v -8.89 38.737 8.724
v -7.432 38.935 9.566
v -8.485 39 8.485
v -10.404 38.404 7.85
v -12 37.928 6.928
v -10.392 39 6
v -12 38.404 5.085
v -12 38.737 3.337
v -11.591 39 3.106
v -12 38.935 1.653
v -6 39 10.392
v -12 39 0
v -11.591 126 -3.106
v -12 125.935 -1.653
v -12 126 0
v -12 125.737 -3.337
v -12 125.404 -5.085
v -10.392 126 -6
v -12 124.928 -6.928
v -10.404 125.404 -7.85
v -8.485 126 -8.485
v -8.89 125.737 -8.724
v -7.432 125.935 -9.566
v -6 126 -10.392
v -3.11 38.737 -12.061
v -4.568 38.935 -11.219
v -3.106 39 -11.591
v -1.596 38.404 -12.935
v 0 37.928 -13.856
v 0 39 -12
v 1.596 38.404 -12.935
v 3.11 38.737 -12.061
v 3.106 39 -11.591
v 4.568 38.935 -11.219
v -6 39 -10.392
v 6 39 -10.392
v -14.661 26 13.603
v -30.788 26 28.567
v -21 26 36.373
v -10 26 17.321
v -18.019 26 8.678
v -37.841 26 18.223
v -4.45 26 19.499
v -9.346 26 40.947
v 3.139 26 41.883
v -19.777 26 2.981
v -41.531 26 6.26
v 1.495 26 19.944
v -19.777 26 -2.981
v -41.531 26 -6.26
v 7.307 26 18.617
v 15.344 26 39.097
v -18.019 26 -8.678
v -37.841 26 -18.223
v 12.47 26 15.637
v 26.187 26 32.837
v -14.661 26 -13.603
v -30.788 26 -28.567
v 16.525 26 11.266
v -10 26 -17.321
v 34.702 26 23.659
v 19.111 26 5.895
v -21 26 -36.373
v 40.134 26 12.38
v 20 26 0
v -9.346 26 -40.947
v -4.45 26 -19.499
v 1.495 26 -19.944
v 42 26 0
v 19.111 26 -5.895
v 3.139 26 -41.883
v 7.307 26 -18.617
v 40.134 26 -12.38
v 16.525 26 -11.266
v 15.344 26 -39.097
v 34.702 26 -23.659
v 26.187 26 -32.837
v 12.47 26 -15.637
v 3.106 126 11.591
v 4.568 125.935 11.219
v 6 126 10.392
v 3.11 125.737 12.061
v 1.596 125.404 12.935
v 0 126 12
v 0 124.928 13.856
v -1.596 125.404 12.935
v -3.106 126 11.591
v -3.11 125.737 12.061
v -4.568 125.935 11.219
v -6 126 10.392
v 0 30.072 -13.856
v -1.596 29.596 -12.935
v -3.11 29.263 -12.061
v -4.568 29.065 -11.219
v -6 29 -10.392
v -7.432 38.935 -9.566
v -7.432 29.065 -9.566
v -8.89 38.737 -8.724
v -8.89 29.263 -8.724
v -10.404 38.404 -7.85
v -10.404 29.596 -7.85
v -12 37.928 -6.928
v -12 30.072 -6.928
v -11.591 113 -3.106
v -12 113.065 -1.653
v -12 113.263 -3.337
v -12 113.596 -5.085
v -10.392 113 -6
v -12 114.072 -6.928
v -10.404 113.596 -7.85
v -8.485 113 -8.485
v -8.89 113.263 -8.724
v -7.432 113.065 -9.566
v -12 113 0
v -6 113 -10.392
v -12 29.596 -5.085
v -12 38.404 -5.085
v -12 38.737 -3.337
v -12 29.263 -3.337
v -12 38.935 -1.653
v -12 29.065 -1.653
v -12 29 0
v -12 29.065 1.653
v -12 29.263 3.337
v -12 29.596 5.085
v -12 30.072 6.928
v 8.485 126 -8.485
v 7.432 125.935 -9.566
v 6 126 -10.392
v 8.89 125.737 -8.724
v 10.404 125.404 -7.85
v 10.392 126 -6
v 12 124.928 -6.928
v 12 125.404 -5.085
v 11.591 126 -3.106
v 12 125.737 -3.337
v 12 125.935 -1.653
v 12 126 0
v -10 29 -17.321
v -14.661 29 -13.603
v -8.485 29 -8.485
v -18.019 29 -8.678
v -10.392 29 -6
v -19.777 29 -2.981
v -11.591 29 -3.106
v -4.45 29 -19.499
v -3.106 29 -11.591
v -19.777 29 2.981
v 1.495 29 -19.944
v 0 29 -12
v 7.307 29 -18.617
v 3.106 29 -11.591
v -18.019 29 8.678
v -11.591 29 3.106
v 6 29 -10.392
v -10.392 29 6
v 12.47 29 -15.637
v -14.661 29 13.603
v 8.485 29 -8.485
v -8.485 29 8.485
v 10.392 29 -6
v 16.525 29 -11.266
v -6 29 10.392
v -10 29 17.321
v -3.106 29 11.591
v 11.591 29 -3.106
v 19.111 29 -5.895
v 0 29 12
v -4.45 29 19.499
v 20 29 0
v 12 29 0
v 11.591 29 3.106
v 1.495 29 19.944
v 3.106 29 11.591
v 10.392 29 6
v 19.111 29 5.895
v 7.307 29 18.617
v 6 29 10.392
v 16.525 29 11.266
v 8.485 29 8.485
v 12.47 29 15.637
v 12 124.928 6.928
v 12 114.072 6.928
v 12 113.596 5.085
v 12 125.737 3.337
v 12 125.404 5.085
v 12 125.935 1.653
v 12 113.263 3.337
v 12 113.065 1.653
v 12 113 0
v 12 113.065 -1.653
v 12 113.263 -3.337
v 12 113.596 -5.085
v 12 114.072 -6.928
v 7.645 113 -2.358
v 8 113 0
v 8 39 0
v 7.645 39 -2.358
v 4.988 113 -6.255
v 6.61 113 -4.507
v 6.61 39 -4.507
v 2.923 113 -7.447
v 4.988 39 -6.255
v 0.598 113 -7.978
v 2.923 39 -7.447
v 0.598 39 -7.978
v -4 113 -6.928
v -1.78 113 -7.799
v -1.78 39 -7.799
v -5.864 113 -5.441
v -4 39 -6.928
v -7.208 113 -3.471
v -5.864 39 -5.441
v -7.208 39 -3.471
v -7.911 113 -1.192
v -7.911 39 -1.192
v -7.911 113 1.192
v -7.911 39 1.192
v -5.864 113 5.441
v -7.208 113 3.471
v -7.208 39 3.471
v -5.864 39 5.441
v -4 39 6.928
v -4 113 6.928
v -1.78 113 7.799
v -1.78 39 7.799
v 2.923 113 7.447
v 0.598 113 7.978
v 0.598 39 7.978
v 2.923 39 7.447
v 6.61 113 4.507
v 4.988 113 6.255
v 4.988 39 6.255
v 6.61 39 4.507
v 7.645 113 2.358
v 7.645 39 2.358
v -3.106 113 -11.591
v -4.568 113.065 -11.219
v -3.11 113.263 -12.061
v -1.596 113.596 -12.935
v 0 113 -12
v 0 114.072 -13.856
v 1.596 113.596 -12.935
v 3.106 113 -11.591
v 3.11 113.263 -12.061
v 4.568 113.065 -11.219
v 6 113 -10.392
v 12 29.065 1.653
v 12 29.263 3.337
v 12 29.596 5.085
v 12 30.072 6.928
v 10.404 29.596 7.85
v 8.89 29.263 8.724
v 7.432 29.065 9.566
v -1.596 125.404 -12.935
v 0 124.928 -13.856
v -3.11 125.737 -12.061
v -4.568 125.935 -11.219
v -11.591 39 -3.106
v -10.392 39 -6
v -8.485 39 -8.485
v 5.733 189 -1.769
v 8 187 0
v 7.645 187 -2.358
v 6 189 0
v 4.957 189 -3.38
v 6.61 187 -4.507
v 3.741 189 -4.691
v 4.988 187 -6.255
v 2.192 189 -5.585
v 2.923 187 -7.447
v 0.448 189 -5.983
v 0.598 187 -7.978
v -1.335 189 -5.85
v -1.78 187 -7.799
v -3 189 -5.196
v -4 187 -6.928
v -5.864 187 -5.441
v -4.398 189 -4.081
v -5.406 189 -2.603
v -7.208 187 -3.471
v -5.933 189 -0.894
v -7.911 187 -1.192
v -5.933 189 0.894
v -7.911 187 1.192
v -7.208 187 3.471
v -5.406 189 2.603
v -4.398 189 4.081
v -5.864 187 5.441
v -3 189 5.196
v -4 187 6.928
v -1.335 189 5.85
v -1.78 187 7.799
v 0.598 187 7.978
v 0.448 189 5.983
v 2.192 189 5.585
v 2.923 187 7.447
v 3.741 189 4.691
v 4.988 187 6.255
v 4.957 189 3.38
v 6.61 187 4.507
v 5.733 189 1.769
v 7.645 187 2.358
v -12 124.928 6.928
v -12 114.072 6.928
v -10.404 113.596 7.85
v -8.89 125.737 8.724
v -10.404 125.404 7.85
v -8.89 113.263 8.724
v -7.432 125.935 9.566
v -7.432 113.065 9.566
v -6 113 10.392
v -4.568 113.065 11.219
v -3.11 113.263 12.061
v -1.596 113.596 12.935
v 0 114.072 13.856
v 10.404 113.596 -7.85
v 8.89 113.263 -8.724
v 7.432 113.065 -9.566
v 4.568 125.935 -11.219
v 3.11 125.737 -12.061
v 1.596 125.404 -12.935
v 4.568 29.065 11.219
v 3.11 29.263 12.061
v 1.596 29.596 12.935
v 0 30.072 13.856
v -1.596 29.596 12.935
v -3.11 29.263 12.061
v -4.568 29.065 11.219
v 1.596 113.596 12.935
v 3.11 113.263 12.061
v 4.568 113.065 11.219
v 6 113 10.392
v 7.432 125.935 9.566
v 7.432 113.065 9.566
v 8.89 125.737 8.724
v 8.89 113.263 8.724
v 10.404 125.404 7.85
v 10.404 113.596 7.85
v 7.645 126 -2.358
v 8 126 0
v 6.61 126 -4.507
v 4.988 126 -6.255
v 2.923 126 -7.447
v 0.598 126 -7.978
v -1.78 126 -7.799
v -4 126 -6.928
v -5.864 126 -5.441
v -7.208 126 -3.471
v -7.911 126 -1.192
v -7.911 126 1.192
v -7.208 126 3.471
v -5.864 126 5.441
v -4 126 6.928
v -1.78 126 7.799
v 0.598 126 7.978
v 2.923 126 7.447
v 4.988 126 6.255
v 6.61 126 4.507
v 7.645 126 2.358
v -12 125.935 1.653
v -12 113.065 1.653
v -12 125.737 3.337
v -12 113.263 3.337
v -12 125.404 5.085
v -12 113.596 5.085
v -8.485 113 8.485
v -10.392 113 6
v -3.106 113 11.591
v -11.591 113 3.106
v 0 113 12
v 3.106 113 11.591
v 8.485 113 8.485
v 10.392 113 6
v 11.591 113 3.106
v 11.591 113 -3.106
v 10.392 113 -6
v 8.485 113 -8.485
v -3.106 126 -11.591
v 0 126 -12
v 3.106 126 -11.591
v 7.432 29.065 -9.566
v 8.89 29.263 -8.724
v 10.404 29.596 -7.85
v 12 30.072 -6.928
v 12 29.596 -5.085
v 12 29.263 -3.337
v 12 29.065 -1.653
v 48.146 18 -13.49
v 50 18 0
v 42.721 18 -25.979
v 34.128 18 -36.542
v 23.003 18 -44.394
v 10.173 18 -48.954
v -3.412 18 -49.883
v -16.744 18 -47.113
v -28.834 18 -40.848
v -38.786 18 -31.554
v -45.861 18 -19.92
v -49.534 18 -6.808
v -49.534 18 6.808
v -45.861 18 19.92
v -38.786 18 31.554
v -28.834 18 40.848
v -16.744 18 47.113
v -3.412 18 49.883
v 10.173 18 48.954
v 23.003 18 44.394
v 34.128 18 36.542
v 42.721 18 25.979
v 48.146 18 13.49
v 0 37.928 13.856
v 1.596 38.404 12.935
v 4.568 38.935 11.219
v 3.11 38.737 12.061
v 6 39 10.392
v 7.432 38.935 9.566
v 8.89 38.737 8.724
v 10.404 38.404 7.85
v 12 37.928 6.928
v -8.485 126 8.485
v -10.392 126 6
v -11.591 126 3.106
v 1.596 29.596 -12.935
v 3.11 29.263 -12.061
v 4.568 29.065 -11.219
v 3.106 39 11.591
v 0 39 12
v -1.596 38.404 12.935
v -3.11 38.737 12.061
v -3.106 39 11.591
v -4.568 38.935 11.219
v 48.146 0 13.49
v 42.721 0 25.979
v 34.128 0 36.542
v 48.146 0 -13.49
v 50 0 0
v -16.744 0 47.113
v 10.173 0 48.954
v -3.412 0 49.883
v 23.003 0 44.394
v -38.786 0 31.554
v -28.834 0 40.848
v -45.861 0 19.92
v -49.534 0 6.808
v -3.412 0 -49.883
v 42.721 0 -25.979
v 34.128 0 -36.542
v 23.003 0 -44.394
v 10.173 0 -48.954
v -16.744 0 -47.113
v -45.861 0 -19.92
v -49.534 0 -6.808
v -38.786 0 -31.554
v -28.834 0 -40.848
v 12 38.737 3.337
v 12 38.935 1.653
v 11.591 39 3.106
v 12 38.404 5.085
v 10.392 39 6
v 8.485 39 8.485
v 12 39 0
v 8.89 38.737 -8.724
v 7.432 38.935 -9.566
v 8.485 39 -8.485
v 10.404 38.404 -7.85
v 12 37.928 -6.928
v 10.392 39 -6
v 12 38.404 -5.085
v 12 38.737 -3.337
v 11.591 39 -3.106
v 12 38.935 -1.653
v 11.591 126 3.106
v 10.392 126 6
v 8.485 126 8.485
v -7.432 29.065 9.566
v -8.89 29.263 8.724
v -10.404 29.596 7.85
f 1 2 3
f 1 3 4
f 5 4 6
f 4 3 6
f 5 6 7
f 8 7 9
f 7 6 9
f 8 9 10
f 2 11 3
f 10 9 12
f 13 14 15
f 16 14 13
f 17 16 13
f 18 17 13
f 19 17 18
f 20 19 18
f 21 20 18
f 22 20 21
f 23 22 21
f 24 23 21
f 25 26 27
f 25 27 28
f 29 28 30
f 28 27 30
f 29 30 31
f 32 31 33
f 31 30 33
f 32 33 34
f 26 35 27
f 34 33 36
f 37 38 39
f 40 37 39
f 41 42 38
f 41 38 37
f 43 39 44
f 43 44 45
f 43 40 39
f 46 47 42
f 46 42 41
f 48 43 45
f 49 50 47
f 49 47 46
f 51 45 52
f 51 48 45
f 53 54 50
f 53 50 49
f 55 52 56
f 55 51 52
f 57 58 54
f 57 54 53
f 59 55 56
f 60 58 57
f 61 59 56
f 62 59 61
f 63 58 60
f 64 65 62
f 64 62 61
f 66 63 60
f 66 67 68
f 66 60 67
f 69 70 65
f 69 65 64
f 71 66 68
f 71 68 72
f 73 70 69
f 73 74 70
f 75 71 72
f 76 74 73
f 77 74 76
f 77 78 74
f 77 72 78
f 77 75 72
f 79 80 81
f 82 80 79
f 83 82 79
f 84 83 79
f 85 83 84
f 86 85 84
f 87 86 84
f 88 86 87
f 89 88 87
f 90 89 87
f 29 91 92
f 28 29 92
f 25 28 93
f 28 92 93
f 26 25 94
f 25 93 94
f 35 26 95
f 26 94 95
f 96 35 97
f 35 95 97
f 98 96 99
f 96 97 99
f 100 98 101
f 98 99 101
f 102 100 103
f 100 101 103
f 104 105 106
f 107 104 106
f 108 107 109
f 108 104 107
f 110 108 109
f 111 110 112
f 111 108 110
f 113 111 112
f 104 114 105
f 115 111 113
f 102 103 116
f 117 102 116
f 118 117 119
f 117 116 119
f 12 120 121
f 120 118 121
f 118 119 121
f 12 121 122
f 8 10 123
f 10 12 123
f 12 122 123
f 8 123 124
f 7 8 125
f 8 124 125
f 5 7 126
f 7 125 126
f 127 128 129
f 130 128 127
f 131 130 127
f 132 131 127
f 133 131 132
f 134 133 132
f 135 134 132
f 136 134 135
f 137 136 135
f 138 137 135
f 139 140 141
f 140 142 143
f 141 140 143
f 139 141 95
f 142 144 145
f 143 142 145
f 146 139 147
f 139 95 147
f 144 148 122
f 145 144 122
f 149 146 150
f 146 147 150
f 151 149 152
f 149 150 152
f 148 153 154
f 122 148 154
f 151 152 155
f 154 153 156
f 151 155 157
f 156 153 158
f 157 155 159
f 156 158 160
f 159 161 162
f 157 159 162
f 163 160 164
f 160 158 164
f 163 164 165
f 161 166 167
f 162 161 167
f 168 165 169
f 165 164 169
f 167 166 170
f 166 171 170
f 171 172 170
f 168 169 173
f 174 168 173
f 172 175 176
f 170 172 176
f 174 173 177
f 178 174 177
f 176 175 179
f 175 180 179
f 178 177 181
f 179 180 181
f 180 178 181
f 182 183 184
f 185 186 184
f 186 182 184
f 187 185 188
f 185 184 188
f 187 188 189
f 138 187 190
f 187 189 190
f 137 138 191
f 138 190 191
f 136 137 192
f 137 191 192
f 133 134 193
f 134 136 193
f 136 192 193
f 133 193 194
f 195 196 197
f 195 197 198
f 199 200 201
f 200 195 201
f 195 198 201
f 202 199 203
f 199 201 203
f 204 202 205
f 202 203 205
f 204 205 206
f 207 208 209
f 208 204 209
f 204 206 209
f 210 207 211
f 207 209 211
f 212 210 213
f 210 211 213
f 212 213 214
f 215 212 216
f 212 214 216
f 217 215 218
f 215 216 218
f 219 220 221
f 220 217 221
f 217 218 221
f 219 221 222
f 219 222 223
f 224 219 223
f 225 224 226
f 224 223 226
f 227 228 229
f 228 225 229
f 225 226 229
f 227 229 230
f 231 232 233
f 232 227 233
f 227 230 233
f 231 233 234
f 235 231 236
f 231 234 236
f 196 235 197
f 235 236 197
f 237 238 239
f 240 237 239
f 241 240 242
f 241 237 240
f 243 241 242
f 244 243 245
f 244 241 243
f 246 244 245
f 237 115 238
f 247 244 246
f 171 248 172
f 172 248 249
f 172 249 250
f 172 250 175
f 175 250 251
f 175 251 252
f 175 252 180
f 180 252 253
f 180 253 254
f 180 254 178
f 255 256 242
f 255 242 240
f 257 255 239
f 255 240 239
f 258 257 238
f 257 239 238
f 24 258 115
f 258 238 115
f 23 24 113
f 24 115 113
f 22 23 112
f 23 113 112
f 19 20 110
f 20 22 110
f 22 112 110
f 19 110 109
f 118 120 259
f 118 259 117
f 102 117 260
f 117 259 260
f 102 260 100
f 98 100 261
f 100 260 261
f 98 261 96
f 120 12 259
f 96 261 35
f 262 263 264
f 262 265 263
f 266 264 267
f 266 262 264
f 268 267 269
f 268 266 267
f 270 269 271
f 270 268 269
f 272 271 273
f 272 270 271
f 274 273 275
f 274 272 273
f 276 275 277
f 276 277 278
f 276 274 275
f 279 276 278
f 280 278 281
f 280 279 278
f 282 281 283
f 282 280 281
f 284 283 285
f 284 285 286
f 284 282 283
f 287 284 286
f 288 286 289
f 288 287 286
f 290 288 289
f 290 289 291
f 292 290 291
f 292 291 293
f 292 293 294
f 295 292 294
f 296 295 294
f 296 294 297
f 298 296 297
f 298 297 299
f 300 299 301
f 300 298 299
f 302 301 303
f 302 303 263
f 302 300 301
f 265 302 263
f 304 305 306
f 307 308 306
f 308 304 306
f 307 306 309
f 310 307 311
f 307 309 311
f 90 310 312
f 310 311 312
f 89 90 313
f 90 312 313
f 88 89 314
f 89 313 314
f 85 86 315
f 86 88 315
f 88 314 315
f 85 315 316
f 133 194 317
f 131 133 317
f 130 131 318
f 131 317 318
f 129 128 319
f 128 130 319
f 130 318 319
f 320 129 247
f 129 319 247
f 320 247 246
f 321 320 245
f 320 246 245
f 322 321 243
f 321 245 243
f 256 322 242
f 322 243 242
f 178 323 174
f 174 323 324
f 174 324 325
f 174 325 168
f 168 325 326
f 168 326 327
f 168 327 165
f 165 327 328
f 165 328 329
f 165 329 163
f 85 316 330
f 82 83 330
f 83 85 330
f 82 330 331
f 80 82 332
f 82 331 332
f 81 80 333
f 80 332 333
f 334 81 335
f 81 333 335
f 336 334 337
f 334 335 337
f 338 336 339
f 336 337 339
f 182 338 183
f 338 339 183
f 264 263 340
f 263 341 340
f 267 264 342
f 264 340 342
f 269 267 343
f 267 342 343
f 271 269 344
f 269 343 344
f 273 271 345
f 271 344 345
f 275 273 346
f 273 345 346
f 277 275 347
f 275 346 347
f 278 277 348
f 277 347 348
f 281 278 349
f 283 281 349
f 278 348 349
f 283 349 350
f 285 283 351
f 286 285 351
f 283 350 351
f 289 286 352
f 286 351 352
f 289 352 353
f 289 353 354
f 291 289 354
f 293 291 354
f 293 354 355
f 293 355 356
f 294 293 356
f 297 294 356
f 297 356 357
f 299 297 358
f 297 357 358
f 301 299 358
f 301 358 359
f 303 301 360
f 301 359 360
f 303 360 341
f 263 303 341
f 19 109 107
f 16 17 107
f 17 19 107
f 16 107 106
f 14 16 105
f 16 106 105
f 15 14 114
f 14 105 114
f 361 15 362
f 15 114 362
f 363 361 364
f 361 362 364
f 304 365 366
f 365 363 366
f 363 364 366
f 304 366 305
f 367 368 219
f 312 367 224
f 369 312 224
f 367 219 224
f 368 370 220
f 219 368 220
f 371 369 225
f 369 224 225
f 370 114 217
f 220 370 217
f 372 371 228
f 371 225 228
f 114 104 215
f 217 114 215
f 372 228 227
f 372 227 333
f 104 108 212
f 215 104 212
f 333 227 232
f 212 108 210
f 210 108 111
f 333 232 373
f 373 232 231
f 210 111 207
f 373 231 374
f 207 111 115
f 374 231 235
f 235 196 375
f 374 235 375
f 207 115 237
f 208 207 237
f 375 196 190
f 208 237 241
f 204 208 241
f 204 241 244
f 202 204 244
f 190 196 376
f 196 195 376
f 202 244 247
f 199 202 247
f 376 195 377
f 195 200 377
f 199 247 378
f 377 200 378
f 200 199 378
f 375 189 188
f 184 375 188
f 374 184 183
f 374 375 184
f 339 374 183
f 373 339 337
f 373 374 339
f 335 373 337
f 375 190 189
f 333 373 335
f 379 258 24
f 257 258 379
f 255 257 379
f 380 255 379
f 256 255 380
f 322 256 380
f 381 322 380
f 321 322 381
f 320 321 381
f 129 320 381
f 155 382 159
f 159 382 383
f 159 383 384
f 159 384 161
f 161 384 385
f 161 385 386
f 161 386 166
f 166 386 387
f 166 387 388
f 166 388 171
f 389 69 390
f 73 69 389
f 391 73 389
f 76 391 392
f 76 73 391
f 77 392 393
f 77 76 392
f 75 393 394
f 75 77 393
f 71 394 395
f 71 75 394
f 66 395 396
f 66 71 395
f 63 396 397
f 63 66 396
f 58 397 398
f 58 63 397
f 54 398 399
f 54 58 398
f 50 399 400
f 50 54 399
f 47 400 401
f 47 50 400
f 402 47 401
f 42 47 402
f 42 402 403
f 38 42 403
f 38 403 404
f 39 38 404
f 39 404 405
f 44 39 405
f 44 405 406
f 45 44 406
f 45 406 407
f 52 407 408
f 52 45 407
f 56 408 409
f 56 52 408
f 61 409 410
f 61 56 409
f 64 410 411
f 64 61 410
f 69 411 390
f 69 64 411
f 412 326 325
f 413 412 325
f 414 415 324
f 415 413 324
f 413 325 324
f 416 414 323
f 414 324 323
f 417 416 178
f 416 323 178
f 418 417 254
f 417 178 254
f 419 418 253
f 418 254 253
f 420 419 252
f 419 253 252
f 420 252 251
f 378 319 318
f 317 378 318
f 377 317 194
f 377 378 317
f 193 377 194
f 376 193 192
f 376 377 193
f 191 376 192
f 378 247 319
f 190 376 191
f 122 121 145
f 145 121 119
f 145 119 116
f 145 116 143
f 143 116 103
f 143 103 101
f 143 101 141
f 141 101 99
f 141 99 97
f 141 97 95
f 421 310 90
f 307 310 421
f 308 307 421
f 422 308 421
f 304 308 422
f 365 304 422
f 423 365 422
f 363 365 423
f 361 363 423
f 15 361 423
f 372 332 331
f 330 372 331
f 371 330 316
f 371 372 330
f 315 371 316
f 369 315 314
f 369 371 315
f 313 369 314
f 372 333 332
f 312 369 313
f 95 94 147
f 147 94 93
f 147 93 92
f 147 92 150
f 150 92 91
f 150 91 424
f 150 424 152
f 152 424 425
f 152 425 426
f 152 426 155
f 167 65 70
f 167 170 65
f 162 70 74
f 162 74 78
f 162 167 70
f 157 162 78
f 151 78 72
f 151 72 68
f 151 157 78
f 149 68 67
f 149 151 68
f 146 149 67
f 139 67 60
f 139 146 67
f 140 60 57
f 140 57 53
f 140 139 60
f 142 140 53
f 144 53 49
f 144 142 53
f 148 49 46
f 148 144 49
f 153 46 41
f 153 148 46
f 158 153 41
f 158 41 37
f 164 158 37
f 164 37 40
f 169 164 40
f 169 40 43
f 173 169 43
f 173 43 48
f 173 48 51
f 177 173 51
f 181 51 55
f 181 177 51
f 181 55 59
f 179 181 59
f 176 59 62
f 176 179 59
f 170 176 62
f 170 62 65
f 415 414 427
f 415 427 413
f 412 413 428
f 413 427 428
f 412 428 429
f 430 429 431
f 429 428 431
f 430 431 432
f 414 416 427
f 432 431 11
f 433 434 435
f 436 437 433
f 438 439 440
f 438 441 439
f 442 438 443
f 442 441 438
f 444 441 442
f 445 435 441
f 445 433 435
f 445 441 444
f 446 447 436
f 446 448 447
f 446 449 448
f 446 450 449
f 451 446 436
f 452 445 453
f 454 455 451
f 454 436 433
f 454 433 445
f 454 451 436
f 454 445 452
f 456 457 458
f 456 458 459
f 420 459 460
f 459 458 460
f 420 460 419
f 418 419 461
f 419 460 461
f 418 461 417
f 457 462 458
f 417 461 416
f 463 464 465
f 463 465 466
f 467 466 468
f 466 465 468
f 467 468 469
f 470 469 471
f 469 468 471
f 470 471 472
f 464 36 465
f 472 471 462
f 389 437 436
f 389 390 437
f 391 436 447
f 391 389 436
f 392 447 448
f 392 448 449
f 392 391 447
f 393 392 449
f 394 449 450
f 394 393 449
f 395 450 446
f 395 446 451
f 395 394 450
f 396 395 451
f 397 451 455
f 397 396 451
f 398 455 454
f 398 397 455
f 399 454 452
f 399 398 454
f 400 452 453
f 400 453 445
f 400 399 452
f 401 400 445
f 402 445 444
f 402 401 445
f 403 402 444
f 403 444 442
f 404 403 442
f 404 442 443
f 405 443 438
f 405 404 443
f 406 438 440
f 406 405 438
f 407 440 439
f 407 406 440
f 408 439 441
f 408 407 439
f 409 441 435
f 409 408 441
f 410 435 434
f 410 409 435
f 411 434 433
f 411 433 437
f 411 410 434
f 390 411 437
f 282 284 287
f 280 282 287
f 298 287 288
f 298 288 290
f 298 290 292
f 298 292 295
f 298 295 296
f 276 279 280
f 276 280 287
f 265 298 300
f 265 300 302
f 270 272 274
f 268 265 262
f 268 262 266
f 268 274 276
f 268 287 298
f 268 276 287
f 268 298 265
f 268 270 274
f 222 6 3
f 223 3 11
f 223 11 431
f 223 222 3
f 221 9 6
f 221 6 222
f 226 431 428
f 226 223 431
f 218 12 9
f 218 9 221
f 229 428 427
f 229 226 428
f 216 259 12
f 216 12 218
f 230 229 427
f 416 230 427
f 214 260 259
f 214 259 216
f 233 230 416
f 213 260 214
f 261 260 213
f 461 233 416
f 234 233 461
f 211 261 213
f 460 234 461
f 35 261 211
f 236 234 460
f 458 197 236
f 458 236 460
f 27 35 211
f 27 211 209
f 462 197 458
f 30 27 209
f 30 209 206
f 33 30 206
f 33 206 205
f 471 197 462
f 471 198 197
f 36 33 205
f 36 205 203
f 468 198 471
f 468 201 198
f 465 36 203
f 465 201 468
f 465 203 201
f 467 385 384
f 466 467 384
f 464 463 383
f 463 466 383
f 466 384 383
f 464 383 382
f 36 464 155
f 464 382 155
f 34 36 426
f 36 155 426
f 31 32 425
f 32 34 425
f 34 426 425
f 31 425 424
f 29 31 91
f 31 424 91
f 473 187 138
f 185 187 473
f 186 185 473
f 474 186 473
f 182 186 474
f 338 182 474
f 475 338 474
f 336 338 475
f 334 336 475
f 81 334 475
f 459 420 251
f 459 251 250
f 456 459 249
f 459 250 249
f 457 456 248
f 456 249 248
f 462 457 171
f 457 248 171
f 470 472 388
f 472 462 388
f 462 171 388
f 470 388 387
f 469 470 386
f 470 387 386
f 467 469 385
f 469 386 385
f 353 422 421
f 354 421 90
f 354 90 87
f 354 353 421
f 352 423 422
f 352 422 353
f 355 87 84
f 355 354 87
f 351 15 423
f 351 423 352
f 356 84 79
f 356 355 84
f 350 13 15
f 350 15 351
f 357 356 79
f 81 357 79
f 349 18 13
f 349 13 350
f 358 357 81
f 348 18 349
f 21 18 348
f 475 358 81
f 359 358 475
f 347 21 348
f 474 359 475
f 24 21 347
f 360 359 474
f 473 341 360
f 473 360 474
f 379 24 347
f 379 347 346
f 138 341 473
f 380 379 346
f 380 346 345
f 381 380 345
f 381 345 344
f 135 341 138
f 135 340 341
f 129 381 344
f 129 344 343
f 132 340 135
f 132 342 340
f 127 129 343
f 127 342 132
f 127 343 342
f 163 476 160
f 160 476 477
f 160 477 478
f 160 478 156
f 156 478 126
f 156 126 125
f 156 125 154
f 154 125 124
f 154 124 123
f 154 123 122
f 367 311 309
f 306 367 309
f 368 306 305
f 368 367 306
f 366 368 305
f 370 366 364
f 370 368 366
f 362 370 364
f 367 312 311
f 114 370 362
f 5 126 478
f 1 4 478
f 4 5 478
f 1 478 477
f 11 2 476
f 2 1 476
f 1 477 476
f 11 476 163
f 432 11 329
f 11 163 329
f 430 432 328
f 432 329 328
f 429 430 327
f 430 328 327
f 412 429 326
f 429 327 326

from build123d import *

# Parameters (mm, degrees)
EXTRUDE_1_DEPTH = 10
EXTRUDE_2_DEPTH = 13


with BuildPart() as part:
    # Эскиз1 → Повернуть1 (revolve)
    with BuildSketch(Plane.XY, mode=Mode.PRIVATE) as revolve_1_sk:
        Polygon((0, 0), (-50, 0), (-50, 18), (-42, 26), (-20, 26), (-20, 29), (-8, 29), (-8, 39), (-8, 187), (-6, 189), (0, 189), align=None)
    revolve(revolve_1_sk.sketch.rotate(Axis((0, 0, 0), (0, 1, 0)), 180), axis=Axis((0, 0, 0), (0, 1, 0)))  # turned: the seam where the file's is

    # Эскиз2 → Бобышка-Вытянуть1 (add)
    with BuildSketch(Plane(origin=(0, 29, 0), x_dir=(1, 0, 0), z_dir=(0, 1, 0))):
        Polygon((0, 13.856406461), (-12, 6.92820323), (-12, -6.92820323), (0, -13.856406461), (12, -6.92820323), (12, 6.92820323), align=None)
    extrude(amount=EXTRUDE_1_DEPTH)

    # Эскиз3 → Бобышка-Вытянуть2 (add)
    with BuildSketch(Plane(origin=(0, 113, 0), x_dir=(1, 0, 0), z_dir=(0, 1, 0))):
        Polygon((12, 6.92820323), (0, 13.856406461), (-12, 6.92820323), (-12, -6.92820323), (0, -13.856406461), (12, -6.92820323), align=None)
    extrude(amount=EXTRUDE_2_DEPTH)

    # Эскиз4 → Вырез-Повернуть2 (revolve, cut)
    with BuildSketch(Plane.XY, mode=Mode.PRIVATE) as cut_revolve_2_sk:
        Polygon((-23.258330249, 126), (-12, 126), (-23.258330249, 119.5), align=None)
        Polygon((-23.258330249, 113), (-23.258330249, 119.5), (-12, 113), align=None)
        Polygon((-20.660254038, 39), (-20.660254038, 34), (-12, 39), align=None)
        Polygon((-20.660254038, 34), (-20.660254038, 29), (-12, 29), align=None)
    revolve(cut_revolve_2_sk.sketch.rotate(Axis((0, 189, 0), (0, -1, 0)), 180), axis=Axis((0, 189, 0), (0, -1, 0)), mode=Mode.SUBTRACT)  # turned: the seam where the file's is


solid = part.part
